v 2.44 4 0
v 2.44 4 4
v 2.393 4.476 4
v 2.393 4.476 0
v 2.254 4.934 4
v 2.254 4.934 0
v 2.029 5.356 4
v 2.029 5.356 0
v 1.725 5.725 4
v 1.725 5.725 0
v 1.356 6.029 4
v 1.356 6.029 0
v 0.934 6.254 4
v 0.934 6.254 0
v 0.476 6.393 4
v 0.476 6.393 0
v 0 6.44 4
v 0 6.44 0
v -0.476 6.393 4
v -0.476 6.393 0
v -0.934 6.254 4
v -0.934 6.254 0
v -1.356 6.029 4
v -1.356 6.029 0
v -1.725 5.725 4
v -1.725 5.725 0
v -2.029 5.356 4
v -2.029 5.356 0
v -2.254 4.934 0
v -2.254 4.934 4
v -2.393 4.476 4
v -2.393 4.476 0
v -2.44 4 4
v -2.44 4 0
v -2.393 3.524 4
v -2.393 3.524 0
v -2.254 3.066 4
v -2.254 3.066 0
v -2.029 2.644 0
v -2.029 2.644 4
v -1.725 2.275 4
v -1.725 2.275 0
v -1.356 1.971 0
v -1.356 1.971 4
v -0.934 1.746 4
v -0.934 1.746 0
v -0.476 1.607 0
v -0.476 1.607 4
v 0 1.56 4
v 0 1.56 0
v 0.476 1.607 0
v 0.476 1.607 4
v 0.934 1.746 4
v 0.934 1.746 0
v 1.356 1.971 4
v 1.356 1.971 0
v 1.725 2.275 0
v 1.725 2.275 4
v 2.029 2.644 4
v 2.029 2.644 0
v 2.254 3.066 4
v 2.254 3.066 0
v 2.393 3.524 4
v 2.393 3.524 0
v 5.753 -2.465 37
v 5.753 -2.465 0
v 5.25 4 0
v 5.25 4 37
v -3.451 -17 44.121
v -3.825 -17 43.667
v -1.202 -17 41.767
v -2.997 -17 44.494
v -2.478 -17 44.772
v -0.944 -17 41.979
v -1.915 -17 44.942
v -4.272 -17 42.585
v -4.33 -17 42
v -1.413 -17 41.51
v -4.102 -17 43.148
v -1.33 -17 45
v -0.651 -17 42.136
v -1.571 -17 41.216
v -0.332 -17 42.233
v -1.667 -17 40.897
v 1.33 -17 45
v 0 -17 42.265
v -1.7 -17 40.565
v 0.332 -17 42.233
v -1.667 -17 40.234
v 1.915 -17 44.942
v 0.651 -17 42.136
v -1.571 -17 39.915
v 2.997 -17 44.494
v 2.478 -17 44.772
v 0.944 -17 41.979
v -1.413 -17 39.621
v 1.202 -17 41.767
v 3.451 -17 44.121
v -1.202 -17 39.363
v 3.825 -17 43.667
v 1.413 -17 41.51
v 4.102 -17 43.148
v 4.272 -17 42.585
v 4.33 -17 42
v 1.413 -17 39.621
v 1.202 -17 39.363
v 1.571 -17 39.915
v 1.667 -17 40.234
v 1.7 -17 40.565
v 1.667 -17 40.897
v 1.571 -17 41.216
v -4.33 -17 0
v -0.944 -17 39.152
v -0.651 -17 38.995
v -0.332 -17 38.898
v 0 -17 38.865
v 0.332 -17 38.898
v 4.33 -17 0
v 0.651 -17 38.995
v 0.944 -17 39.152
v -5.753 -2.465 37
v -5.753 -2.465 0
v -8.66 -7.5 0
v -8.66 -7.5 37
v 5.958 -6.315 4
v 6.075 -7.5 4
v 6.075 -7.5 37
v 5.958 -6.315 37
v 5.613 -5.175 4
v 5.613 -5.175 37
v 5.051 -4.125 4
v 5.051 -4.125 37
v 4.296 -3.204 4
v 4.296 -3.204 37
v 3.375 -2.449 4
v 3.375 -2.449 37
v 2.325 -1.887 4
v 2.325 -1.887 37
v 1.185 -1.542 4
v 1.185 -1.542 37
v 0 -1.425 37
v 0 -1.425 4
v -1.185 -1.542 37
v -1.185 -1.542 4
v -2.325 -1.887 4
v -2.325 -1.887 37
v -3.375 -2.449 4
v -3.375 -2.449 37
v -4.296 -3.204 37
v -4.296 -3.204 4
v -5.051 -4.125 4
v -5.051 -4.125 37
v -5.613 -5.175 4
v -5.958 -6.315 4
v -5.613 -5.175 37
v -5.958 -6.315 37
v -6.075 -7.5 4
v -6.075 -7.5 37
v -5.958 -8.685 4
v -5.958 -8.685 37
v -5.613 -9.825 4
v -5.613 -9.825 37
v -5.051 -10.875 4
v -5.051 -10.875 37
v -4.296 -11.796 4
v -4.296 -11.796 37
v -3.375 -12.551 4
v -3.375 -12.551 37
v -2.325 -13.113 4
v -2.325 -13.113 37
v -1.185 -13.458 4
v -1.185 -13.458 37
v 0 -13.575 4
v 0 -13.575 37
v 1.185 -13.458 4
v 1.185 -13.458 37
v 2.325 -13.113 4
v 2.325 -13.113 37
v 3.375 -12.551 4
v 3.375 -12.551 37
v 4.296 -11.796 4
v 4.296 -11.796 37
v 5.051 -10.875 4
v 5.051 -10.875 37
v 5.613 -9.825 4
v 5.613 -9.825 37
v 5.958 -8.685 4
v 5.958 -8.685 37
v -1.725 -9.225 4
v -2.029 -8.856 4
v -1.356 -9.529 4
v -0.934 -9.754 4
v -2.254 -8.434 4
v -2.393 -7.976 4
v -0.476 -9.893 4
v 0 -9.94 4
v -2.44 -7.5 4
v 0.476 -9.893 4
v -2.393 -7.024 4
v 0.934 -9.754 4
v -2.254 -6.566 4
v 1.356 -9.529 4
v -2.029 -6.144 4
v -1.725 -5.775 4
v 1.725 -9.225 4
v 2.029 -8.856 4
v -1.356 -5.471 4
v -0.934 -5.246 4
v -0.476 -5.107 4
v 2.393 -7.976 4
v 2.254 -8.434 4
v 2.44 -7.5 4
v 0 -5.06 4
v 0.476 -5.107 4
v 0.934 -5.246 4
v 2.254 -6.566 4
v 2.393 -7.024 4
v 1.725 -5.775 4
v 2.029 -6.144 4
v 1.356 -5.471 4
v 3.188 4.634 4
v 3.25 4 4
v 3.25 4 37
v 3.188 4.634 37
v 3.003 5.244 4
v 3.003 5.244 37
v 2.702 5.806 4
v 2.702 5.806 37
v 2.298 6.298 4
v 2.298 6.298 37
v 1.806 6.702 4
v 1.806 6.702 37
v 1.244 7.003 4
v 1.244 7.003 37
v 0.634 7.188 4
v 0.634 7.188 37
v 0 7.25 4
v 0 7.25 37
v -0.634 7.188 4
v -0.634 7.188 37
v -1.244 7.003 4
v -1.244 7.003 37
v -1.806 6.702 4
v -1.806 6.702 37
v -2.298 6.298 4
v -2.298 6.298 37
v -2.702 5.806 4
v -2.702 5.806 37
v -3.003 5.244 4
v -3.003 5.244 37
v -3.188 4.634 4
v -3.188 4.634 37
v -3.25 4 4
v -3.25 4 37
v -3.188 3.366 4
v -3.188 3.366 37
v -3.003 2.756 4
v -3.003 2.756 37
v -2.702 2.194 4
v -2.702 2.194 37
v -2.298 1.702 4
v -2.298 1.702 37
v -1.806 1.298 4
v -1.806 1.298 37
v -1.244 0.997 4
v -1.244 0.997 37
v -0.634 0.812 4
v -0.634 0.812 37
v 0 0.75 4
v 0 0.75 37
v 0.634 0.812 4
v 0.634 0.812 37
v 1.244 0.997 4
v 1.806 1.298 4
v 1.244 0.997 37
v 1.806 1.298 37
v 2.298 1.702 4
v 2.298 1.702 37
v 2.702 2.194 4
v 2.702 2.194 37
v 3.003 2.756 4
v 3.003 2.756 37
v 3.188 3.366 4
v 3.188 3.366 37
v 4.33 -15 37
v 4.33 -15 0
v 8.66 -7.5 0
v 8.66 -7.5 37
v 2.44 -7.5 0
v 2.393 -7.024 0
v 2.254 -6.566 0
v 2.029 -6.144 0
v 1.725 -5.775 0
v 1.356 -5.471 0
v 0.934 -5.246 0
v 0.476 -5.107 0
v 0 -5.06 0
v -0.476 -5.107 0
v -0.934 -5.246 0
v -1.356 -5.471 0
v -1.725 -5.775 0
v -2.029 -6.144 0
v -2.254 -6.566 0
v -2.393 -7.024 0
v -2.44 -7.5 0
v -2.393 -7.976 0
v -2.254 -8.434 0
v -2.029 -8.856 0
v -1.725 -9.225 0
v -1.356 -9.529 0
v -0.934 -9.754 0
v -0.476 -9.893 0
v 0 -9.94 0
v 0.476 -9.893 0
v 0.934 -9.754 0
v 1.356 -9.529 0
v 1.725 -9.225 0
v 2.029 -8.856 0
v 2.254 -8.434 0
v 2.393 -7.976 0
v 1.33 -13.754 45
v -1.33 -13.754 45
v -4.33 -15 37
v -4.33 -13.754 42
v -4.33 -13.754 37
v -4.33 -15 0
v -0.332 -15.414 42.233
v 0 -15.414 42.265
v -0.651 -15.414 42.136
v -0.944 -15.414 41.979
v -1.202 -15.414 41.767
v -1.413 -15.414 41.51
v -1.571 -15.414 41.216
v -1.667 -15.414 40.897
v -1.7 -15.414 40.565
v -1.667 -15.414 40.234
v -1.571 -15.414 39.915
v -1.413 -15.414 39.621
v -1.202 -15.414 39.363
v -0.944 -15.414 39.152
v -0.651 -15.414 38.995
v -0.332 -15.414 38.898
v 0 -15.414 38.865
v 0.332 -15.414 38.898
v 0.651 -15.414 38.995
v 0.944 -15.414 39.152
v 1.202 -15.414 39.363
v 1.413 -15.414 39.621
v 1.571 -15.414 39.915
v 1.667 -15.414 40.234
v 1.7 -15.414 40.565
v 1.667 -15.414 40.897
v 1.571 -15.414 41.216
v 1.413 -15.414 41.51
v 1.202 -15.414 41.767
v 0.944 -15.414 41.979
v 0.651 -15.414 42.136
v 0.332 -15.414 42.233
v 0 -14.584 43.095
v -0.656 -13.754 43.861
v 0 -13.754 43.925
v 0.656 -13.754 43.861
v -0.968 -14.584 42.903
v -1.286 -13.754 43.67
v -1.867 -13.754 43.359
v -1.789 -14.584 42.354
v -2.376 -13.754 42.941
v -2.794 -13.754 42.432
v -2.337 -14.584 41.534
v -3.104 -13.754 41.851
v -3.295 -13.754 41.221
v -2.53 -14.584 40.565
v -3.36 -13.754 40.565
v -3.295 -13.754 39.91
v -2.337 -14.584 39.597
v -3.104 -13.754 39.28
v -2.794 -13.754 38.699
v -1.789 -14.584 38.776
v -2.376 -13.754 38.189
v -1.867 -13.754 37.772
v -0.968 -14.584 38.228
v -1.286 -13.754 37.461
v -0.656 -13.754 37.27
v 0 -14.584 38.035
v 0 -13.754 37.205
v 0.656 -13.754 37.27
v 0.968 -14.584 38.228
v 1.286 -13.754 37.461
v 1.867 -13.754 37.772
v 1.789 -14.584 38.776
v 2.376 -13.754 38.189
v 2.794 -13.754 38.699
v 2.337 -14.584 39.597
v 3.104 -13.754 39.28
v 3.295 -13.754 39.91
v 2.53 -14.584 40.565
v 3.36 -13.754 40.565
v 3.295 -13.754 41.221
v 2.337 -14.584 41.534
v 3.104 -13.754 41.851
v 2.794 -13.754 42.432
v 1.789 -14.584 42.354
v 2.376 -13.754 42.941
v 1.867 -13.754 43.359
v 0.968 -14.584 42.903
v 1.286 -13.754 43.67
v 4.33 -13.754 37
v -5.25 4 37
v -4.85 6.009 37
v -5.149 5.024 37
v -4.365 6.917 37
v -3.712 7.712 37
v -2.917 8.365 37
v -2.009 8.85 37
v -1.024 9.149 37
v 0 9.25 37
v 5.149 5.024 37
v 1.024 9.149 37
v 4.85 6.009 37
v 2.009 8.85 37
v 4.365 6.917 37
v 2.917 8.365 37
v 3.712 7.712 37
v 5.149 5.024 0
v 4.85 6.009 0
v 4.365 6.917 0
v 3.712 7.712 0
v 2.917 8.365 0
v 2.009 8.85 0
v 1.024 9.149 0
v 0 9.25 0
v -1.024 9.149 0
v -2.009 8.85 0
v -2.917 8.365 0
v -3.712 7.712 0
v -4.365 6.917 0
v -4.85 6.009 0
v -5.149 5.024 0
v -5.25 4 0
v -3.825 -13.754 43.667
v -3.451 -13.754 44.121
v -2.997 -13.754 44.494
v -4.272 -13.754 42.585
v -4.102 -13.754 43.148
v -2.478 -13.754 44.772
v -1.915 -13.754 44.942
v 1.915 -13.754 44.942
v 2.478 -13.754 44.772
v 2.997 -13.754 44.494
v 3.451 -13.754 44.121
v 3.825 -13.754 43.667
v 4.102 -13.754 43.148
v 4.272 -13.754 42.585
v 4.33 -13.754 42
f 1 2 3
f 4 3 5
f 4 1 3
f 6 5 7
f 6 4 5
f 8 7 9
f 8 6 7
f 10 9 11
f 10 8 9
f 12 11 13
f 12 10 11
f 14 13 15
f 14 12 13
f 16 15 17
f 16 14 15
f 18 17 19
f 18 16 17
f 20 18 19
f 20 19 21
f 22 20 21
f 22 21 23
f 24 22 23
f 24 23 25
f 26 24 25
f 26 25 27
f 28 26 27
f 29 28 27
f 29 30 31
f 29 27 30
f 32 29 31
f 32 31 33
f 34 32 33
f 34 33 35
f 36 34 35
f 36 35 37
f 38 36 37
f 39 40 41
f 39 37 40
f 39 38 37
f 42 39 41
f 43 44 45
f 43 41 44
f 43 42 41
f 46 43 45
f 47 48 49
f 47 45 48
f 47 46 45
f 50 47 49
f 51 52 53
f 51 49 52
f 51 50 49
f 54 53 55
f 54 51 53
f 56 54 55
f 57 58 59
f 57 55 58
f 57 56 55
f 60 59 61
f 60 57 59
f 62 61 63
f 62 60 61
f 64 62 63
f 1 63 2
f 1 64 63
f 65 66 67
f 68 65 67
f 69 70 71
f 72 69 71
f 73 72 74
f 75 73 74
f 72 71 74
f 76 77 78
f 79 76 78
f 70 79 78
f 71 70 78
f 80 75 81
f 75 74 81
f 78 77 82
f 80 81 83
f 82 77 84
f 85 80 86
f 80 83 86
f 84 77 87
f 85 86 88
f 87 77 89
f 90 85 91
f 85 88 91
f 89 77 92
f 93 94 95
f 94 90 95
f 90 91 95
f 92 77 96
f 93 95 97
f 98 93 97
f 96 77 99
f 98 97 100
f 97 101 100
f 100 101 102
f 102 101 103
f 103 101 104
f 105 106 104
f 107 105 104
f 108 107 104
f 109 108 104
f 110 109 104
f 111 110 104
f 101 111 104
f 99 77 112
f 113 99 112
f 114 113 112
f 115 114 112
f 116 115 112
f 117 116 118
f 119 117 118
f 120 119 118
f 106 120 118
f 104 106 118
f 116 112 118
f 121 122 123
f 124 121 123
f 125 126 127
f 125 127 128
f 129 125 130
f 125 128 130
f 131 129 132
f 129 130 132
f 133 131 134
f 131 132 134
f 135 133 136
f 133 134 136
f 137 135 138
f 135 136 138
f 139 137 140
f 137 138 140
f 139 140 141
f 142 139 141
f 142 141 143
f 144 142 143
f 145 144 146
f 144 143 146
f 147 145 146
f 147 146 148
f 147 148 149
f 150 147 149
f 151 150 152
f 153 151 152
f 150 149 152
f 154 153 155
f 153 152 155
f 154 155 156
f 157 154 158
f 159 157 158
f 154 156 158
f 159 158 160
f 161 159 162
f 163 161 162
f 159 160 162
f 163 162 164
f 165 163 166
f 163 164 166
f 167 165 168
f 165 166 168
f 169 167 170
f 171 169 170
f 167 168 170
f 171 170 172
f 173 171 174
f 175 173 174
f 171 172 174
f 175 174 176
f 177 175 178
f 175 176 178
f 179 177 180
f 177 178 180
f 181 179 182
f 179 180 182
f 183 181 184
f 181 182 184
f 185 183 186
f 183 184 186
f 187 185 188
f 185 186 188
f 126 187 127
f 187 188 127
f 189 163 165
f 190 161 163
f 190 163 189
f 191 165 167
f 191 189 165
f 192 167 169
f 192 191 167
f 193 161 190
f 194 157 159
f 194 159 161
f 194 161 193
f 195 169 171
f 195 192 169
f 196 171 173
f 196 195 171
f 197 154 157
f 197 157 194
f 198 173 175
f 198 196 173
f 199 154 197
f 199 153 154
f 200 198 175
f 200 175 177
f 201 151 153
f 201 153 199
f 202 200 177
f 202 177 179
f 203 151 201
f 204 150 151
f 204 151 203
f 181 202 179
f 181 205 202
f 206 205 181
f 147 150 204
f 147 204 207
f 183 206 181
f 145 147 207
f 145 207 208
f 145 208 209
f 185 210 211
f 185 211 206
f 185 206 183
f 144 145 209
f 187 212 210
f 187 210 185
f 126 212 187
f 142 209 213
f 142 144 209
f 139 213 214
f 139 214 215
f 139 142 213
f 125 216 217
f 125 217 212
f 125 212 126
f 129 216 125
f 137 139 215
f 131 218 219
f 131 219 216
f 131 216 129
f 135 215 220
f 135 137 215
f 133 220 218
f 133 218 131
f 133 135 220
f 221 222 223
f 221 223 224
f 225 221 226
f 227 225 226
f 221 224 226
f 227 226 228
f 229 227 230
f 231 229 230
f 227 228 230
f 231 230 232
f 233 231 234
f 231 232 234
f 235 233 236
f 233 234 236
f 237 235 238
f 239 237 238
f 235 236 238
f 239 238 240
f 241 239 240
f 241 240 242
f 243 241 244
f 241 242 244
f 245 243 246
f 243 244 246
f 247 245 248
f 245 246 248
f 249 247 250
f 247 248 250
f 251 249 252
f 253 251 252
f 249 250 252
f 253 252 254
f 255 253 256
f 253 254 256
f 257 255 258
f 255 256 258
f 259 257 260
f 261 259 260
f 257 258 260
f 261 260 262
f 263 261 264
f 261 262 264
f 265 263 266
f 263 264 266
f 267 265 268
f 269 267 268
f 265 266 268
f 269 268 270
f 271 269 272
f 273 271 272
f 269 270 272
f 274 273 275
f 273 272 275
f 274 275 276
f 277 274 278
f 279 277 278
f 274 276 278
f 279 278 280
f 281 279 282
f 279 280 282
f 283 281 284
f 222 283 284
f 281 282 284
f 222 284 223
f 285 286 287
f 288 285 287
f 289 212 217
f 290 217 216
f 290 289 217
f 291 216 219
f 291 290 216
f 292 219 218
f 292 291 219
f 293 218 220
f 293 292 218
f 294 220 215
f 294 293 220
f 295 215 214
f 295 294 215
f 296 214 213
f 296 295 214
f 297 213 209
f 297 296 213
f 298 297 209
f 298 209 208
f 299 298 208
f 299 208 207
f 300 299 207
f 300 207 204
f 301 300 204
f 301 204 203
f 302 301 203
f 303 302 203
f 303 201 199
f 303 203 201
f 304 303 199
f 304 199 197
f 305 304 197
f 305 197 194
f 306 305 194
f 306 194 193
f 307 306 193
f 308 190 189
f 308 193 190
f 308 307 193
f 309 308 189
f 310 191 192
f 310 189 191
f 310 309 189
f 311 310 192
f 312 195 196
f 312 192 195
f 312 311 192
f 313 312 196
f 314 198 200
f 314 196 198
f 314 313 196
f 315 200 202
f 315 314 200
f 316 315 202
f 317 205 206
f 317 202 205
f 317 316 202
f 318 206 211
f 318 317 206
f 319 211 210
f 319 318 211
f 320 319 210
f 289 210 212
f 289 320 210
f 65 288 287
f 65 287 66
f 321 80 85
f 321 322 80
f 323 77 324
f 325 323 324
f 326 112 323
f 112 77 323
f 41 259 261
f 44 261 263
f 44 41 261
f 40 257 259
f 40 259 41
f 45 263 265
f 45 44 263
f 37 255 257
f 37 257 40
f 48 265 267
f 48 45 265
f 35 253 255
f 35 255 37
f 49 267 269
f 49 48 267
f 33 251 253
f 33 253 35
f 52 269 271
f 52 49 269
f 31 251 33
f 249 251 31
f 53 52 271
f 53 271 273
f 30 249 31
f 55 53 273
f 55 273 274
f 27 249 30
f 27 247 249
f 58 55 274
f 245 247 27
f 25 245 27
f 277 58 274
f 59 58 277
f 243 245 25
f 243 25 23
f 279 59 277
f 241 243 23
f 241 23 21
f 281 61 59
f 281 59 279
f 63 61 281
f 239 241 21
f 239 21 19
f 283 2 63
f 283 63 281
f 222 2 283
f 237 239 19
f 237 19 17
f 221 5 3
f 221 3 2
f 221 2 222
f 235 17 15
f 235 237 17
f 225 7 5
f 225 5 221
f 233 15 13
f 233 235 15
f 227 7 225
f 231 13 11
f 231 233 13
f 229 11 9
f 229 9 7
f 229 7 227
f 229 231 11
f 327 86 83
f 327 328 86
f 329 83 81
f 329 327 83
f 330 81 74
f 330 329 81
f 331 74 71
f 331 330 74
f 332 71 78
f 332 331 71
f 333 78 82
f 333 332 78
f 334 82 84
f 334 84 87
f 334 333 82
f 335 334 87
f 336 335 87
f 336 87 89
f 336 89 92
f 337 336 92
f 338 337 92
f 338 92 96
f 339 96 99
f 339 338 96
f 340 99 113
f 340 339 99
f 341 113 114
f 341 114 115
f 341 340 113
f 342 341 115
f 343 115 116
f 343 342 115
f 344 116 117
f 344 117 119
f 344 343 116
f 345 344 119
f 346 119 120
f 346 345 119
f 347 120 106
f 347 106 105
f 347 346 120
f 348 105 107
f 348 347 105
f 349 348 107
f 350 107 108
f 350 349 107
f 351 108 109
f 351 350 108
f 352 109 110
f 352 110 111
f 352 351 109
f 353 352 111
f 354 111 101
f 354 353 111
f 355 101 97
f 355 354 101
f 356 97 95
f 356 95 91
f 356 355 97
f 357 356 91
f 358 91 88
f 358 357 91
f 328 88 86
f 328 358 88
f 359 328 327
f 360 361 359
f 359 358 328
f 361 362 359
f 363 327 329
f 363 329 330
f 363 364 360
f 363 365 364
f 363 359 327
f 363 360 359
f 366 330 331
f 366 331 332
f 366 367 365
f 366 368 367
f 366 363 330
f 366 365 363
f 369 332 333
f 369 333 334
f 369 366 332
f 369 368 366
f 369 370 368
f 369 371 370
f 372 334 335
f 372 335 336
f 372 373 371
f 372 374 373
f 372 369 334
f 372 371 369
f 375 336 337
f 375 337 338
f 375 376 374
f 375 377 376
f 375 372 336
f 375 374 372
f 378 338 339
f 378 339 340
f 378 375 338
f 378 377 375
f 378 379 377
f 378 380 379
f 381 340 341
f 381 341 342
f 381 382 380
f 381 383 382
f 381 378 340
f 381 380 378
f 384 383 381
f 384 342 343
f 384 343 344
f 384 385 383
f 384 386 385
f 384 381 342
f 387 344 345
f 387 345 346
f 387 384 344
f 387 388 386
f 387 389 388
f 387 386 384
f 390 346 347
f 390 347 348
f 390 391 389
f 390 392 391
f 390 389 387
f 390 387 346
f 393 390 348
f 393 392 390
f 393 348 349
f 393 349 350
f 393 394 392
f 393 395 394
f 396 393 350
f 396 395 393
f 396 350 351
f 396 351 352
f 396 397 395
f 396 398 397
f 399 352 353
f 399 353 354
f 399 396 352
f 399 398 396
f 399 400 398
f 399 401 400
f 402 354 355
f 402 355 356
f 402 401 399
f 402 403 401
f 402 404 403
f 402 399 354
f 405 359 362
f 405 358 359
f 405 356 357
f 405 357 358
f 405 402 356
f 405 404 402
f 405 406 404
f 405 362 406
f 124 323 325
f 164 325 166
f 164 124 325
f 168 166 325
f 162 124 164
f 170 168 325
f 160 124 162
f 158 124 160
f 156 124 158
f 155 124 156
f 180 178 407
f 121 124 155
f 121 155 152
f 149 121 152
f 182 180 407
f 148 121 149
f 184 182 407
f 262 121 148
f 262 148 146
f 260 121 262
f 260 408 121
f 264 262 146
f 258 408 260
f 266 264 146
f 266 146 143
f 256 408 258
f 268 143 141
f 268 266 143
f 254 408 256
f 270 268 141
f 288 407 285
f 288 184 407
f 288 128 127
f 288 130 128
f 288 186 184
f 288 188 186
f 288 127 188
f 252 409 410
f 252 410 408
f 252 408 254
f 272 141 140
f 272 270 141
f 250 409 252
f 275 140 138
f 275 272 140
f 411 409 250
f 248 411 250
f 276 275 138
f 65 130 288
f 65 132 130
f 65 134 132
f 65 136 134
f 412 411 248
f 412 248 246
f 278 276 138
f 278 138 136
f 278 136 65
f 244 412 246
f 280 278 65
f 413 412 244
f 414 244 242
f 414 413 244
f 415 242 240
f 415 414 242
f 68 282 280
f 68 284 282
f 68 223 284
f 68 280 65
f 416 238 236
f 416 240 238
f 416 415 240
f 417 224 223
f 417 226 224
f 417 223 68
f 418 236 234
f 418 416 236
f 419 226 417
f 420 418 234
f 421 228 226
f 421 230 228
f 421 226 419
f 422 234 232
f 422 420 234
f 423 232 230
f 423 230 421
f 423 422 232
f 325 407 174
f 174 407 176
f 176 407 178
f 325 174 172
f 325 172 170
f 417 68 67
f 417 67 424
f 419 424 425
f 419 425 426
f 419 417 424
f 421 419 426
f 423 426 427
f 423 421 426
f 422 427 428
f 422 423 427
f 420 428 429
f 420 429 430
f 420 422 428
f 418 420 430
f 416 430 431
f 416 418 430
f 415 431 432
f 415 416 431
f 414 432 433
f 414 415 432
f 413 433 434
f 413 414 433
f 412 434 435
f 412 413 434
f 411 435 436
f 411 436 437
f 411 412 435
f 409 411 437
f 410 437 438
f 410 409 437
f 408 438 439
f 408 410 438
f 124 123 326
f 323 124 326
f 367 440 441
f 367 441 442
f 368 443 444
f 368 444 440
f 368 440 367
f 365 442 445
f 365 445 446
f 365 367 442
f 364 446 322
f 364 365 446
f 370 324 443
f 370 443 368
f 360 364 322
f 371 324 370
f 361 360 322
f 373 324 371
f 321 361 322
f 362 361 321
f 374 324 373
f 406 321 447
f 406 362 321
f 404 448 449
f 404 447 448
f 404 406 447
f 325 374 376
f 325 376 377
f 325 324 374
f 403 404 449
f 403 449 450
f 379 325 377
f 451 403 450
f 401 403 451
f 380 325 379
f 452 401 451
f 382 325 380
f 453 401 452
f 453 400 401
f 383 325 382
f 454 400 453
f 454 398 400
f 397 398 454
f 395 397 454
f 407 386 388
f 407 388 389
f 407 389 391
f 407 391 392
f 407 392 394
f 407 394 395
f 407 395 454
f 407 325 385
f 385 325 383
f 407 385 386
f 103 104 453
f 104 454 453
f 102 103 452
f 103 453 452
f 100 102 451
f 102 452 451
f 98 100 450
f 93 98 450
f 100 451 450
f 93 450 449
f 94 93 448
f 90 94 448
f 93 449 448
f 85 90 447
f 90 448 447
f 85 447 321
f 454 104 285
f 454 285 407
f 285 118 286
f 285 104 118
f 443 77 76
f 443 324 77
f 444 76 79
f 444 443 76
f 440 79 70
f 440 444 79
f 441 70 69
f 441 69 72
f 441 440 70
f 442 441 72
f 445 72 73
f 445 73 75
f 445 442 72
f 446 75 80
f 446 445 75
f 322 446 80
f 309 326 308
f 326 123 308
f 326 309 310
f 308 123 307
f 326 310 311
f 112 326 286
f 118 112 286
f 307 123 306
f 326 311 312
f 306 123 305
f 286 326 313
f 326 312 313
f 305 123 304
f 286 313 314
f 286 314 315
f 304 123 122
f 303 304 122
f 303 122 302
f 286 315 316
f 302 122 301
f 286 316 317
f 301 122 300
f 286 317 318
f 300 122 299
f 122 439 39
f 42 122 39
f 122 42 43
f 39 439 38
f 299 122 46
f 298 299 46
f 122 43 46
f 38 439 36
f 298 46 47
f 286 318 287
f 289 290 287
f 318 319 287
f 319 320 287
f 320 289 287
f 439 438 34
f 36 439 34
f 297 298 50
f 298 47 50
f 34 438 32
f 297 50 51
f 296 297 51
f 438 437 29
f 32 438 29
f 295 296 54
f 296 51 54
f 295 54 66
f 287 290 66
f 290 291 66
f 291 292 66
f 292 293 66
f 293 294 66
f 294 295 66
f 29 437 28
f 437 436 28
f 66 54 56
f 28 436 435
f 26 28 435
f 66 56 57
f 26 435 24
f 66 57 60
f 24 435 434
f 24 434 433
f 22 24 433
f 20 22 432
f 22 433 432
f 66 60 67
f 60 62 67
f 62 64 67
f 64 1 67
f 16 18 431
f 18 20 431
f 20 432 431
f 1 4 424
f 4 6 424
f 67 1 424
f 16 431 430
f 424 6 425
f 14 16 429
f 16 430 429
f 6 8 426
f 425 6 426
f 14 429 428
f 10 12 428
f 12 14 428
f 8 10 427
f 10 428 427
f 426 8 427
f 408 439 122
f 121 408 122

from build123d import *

# Parameters (mm, degrees)
SKETCH1_R           = 2.44
BOSS_EXTRUDE2_DEPTH = 37
SKETCH8_R           = 3.25
SKETCH8_R_2         = 6.075
CUT_EXTRUDE1_DEPTH  = 33
BOSS_EXTRUDE4_DEPTH = 37
SKETCH18_W          = 8.660254038
SKETCH18_H          = 37
BOSS_EXTRUDE5_DEPTH = 2
SKETCH19_W          = 8.660254038
SKETCH19_H          = 3.245908706
BOSS_EXTRUDE6_DEPTH = 8
FILLET4_R           = 3


with BuildPart() as part:
    # Sketch1 → Boss-Extrude2 (new body)
    with BuildSketch(Plane.XY):
        with BuildLine():
            ThreePointArc((3.987455097, 4.316546763), (0, 8), (-3.987455097, 4.316546763))
            Line((-3.987455097, 4.316546763), (-4.330127019, 0))
            Line((-4.330127019, 0), (-8.660254038, -7.5))
            Line((-8.660254038, -7.5), (-4.330127019, -15))
            Line((-4.330127019, -15), (4.330127019, -15))
            Line((4.330127019, -15), (8.660254038, -7.5))
            Line((8.660254038, -7.5), (4.330127019, 0))
            Line((4.330127019, 0), (3.987455097, 4.316546763))
        make_face()
        with Locations((0, 4)):
            Circle(SKETCH1_R, mode=Mode.SUBTRACT)
        with Locations((0, -7.5)):
            Circle(SKETCH1_R, mode=Mode.SUBTRACT)
    extrude(amount=BOSS_EXTRUDE2_DEPTH)

    # Sketch8 → Cut-Extrude1 (cut)
    with BuildSketch(Plane.XY.offset(37)):
        with Locations((0, 4)):
            Circle(SKETCH8_R)
        with Locations((0, -7.5)):
            Circle(SKETCH8_R_2)
    extrude(amount=-CUT_EXTRUDE1_DEPTH, mode=Mode.SUBTRACT)

    # Sketch15 → Boss-Extrude4 (add)
    with BuildSketch(Plane.XY.offset(37)):
        with BuildLine():
            ThreePointArc((5.25, 4), (0, 9.25), (-5.25, 4))
            ThreePointArc((-5.25, 4), (-4.995467041, 2.385128786), (-4.256548938, 0.926843456))
            Line((-4.256548938, 0.926843456), (-3.987455097, 4.316546763))
            ThreePointArc((-3.987455097, 4.316546763), (0, 8), (3.987455097, 4.316546763))
            Line((3.987455097, 4.316546763), (4.256548938, 0.926843456))
            ThreePointArc((4.256548938, 0.926843456), (4.995467041, 2.385128786), (5.25, 4))
        make_face()
        with BuildLine():
            ThreePointArc((-4.256548938, 0.926843456), (-4.995467041, 2.385128786), (-5.25, 4))
            Line((-5.25, 4), (-5.753496857, -2.465348878))
            Line((-5.753496857, -2.465348878), (-4.330127019, 0))
            Line((-4.330127019, 0), (-4.256548938, 0.926843456))
        make_face()
        with BuildLine():
            Line((5.753496857, -2.465348878), (5.25, 4))
            ThreePointArc((5.25, 4), (4.995467041, 2.385128786), (4.256548938, 0.926843456))
            Line((4.256548938, 0.926843456), (4.330127019, 0))
            Line((4.330127019, 0), (5.753496857, -2.465348878))
        make_face()
    extrude(amount=-BOSS_EXTRUDE4_DEPTH)

    # Sketch18 → Boss-Extrude5 (add)
    with BuildSketch(Plane.XZ.offset(15)):
        with Locations((0, 18.5)):
            Rectangle(SKETCH18_W, SKETCH18_H)
    extrude(amount=BOSS_EXTRUDE5_DEPTH)

    # Sketch19 → Boss-Extrude6 (add)
    with BuildSketch(Plane.XY.offset(37)):
        with Locations((0, -15.377045647)):
            Rectangle(SKETCH19_W, SKETCH19_H)
    extrude(amount=BOSS_EXTRUDE6_DEPTH)

    # Fillet4
    fillet4_edges = [part.edges().sort_by_distance(p)[0] for p in [
        (-4.330127019, -15.377045647, 45),
        (4.330127019, -15.377045647, 45),
    ]]
    fillet(fillet4_edges, radius=FILLET4_R)

    # Sketch21 → CSK for M3 Hex Socket Countersunk Cap Screw1 (revolve, cut)
    with BuildSketch(Plane(origin=(0, -13.754091294, 40.565360139), x_dir=(0, 0, 1), z_dir=(1, 0, 0))):
        Polygon((0, 0), (0, 3.245908706), (1.7, 3.245908706), (1.7, 1.66), (3.36, 0), align=None)
    revolve(axis=Axis((0, -7.404091294, 40.565360139), (0, -1, 0)), mode=Mode.SUBTRACT)


solid = part.part
